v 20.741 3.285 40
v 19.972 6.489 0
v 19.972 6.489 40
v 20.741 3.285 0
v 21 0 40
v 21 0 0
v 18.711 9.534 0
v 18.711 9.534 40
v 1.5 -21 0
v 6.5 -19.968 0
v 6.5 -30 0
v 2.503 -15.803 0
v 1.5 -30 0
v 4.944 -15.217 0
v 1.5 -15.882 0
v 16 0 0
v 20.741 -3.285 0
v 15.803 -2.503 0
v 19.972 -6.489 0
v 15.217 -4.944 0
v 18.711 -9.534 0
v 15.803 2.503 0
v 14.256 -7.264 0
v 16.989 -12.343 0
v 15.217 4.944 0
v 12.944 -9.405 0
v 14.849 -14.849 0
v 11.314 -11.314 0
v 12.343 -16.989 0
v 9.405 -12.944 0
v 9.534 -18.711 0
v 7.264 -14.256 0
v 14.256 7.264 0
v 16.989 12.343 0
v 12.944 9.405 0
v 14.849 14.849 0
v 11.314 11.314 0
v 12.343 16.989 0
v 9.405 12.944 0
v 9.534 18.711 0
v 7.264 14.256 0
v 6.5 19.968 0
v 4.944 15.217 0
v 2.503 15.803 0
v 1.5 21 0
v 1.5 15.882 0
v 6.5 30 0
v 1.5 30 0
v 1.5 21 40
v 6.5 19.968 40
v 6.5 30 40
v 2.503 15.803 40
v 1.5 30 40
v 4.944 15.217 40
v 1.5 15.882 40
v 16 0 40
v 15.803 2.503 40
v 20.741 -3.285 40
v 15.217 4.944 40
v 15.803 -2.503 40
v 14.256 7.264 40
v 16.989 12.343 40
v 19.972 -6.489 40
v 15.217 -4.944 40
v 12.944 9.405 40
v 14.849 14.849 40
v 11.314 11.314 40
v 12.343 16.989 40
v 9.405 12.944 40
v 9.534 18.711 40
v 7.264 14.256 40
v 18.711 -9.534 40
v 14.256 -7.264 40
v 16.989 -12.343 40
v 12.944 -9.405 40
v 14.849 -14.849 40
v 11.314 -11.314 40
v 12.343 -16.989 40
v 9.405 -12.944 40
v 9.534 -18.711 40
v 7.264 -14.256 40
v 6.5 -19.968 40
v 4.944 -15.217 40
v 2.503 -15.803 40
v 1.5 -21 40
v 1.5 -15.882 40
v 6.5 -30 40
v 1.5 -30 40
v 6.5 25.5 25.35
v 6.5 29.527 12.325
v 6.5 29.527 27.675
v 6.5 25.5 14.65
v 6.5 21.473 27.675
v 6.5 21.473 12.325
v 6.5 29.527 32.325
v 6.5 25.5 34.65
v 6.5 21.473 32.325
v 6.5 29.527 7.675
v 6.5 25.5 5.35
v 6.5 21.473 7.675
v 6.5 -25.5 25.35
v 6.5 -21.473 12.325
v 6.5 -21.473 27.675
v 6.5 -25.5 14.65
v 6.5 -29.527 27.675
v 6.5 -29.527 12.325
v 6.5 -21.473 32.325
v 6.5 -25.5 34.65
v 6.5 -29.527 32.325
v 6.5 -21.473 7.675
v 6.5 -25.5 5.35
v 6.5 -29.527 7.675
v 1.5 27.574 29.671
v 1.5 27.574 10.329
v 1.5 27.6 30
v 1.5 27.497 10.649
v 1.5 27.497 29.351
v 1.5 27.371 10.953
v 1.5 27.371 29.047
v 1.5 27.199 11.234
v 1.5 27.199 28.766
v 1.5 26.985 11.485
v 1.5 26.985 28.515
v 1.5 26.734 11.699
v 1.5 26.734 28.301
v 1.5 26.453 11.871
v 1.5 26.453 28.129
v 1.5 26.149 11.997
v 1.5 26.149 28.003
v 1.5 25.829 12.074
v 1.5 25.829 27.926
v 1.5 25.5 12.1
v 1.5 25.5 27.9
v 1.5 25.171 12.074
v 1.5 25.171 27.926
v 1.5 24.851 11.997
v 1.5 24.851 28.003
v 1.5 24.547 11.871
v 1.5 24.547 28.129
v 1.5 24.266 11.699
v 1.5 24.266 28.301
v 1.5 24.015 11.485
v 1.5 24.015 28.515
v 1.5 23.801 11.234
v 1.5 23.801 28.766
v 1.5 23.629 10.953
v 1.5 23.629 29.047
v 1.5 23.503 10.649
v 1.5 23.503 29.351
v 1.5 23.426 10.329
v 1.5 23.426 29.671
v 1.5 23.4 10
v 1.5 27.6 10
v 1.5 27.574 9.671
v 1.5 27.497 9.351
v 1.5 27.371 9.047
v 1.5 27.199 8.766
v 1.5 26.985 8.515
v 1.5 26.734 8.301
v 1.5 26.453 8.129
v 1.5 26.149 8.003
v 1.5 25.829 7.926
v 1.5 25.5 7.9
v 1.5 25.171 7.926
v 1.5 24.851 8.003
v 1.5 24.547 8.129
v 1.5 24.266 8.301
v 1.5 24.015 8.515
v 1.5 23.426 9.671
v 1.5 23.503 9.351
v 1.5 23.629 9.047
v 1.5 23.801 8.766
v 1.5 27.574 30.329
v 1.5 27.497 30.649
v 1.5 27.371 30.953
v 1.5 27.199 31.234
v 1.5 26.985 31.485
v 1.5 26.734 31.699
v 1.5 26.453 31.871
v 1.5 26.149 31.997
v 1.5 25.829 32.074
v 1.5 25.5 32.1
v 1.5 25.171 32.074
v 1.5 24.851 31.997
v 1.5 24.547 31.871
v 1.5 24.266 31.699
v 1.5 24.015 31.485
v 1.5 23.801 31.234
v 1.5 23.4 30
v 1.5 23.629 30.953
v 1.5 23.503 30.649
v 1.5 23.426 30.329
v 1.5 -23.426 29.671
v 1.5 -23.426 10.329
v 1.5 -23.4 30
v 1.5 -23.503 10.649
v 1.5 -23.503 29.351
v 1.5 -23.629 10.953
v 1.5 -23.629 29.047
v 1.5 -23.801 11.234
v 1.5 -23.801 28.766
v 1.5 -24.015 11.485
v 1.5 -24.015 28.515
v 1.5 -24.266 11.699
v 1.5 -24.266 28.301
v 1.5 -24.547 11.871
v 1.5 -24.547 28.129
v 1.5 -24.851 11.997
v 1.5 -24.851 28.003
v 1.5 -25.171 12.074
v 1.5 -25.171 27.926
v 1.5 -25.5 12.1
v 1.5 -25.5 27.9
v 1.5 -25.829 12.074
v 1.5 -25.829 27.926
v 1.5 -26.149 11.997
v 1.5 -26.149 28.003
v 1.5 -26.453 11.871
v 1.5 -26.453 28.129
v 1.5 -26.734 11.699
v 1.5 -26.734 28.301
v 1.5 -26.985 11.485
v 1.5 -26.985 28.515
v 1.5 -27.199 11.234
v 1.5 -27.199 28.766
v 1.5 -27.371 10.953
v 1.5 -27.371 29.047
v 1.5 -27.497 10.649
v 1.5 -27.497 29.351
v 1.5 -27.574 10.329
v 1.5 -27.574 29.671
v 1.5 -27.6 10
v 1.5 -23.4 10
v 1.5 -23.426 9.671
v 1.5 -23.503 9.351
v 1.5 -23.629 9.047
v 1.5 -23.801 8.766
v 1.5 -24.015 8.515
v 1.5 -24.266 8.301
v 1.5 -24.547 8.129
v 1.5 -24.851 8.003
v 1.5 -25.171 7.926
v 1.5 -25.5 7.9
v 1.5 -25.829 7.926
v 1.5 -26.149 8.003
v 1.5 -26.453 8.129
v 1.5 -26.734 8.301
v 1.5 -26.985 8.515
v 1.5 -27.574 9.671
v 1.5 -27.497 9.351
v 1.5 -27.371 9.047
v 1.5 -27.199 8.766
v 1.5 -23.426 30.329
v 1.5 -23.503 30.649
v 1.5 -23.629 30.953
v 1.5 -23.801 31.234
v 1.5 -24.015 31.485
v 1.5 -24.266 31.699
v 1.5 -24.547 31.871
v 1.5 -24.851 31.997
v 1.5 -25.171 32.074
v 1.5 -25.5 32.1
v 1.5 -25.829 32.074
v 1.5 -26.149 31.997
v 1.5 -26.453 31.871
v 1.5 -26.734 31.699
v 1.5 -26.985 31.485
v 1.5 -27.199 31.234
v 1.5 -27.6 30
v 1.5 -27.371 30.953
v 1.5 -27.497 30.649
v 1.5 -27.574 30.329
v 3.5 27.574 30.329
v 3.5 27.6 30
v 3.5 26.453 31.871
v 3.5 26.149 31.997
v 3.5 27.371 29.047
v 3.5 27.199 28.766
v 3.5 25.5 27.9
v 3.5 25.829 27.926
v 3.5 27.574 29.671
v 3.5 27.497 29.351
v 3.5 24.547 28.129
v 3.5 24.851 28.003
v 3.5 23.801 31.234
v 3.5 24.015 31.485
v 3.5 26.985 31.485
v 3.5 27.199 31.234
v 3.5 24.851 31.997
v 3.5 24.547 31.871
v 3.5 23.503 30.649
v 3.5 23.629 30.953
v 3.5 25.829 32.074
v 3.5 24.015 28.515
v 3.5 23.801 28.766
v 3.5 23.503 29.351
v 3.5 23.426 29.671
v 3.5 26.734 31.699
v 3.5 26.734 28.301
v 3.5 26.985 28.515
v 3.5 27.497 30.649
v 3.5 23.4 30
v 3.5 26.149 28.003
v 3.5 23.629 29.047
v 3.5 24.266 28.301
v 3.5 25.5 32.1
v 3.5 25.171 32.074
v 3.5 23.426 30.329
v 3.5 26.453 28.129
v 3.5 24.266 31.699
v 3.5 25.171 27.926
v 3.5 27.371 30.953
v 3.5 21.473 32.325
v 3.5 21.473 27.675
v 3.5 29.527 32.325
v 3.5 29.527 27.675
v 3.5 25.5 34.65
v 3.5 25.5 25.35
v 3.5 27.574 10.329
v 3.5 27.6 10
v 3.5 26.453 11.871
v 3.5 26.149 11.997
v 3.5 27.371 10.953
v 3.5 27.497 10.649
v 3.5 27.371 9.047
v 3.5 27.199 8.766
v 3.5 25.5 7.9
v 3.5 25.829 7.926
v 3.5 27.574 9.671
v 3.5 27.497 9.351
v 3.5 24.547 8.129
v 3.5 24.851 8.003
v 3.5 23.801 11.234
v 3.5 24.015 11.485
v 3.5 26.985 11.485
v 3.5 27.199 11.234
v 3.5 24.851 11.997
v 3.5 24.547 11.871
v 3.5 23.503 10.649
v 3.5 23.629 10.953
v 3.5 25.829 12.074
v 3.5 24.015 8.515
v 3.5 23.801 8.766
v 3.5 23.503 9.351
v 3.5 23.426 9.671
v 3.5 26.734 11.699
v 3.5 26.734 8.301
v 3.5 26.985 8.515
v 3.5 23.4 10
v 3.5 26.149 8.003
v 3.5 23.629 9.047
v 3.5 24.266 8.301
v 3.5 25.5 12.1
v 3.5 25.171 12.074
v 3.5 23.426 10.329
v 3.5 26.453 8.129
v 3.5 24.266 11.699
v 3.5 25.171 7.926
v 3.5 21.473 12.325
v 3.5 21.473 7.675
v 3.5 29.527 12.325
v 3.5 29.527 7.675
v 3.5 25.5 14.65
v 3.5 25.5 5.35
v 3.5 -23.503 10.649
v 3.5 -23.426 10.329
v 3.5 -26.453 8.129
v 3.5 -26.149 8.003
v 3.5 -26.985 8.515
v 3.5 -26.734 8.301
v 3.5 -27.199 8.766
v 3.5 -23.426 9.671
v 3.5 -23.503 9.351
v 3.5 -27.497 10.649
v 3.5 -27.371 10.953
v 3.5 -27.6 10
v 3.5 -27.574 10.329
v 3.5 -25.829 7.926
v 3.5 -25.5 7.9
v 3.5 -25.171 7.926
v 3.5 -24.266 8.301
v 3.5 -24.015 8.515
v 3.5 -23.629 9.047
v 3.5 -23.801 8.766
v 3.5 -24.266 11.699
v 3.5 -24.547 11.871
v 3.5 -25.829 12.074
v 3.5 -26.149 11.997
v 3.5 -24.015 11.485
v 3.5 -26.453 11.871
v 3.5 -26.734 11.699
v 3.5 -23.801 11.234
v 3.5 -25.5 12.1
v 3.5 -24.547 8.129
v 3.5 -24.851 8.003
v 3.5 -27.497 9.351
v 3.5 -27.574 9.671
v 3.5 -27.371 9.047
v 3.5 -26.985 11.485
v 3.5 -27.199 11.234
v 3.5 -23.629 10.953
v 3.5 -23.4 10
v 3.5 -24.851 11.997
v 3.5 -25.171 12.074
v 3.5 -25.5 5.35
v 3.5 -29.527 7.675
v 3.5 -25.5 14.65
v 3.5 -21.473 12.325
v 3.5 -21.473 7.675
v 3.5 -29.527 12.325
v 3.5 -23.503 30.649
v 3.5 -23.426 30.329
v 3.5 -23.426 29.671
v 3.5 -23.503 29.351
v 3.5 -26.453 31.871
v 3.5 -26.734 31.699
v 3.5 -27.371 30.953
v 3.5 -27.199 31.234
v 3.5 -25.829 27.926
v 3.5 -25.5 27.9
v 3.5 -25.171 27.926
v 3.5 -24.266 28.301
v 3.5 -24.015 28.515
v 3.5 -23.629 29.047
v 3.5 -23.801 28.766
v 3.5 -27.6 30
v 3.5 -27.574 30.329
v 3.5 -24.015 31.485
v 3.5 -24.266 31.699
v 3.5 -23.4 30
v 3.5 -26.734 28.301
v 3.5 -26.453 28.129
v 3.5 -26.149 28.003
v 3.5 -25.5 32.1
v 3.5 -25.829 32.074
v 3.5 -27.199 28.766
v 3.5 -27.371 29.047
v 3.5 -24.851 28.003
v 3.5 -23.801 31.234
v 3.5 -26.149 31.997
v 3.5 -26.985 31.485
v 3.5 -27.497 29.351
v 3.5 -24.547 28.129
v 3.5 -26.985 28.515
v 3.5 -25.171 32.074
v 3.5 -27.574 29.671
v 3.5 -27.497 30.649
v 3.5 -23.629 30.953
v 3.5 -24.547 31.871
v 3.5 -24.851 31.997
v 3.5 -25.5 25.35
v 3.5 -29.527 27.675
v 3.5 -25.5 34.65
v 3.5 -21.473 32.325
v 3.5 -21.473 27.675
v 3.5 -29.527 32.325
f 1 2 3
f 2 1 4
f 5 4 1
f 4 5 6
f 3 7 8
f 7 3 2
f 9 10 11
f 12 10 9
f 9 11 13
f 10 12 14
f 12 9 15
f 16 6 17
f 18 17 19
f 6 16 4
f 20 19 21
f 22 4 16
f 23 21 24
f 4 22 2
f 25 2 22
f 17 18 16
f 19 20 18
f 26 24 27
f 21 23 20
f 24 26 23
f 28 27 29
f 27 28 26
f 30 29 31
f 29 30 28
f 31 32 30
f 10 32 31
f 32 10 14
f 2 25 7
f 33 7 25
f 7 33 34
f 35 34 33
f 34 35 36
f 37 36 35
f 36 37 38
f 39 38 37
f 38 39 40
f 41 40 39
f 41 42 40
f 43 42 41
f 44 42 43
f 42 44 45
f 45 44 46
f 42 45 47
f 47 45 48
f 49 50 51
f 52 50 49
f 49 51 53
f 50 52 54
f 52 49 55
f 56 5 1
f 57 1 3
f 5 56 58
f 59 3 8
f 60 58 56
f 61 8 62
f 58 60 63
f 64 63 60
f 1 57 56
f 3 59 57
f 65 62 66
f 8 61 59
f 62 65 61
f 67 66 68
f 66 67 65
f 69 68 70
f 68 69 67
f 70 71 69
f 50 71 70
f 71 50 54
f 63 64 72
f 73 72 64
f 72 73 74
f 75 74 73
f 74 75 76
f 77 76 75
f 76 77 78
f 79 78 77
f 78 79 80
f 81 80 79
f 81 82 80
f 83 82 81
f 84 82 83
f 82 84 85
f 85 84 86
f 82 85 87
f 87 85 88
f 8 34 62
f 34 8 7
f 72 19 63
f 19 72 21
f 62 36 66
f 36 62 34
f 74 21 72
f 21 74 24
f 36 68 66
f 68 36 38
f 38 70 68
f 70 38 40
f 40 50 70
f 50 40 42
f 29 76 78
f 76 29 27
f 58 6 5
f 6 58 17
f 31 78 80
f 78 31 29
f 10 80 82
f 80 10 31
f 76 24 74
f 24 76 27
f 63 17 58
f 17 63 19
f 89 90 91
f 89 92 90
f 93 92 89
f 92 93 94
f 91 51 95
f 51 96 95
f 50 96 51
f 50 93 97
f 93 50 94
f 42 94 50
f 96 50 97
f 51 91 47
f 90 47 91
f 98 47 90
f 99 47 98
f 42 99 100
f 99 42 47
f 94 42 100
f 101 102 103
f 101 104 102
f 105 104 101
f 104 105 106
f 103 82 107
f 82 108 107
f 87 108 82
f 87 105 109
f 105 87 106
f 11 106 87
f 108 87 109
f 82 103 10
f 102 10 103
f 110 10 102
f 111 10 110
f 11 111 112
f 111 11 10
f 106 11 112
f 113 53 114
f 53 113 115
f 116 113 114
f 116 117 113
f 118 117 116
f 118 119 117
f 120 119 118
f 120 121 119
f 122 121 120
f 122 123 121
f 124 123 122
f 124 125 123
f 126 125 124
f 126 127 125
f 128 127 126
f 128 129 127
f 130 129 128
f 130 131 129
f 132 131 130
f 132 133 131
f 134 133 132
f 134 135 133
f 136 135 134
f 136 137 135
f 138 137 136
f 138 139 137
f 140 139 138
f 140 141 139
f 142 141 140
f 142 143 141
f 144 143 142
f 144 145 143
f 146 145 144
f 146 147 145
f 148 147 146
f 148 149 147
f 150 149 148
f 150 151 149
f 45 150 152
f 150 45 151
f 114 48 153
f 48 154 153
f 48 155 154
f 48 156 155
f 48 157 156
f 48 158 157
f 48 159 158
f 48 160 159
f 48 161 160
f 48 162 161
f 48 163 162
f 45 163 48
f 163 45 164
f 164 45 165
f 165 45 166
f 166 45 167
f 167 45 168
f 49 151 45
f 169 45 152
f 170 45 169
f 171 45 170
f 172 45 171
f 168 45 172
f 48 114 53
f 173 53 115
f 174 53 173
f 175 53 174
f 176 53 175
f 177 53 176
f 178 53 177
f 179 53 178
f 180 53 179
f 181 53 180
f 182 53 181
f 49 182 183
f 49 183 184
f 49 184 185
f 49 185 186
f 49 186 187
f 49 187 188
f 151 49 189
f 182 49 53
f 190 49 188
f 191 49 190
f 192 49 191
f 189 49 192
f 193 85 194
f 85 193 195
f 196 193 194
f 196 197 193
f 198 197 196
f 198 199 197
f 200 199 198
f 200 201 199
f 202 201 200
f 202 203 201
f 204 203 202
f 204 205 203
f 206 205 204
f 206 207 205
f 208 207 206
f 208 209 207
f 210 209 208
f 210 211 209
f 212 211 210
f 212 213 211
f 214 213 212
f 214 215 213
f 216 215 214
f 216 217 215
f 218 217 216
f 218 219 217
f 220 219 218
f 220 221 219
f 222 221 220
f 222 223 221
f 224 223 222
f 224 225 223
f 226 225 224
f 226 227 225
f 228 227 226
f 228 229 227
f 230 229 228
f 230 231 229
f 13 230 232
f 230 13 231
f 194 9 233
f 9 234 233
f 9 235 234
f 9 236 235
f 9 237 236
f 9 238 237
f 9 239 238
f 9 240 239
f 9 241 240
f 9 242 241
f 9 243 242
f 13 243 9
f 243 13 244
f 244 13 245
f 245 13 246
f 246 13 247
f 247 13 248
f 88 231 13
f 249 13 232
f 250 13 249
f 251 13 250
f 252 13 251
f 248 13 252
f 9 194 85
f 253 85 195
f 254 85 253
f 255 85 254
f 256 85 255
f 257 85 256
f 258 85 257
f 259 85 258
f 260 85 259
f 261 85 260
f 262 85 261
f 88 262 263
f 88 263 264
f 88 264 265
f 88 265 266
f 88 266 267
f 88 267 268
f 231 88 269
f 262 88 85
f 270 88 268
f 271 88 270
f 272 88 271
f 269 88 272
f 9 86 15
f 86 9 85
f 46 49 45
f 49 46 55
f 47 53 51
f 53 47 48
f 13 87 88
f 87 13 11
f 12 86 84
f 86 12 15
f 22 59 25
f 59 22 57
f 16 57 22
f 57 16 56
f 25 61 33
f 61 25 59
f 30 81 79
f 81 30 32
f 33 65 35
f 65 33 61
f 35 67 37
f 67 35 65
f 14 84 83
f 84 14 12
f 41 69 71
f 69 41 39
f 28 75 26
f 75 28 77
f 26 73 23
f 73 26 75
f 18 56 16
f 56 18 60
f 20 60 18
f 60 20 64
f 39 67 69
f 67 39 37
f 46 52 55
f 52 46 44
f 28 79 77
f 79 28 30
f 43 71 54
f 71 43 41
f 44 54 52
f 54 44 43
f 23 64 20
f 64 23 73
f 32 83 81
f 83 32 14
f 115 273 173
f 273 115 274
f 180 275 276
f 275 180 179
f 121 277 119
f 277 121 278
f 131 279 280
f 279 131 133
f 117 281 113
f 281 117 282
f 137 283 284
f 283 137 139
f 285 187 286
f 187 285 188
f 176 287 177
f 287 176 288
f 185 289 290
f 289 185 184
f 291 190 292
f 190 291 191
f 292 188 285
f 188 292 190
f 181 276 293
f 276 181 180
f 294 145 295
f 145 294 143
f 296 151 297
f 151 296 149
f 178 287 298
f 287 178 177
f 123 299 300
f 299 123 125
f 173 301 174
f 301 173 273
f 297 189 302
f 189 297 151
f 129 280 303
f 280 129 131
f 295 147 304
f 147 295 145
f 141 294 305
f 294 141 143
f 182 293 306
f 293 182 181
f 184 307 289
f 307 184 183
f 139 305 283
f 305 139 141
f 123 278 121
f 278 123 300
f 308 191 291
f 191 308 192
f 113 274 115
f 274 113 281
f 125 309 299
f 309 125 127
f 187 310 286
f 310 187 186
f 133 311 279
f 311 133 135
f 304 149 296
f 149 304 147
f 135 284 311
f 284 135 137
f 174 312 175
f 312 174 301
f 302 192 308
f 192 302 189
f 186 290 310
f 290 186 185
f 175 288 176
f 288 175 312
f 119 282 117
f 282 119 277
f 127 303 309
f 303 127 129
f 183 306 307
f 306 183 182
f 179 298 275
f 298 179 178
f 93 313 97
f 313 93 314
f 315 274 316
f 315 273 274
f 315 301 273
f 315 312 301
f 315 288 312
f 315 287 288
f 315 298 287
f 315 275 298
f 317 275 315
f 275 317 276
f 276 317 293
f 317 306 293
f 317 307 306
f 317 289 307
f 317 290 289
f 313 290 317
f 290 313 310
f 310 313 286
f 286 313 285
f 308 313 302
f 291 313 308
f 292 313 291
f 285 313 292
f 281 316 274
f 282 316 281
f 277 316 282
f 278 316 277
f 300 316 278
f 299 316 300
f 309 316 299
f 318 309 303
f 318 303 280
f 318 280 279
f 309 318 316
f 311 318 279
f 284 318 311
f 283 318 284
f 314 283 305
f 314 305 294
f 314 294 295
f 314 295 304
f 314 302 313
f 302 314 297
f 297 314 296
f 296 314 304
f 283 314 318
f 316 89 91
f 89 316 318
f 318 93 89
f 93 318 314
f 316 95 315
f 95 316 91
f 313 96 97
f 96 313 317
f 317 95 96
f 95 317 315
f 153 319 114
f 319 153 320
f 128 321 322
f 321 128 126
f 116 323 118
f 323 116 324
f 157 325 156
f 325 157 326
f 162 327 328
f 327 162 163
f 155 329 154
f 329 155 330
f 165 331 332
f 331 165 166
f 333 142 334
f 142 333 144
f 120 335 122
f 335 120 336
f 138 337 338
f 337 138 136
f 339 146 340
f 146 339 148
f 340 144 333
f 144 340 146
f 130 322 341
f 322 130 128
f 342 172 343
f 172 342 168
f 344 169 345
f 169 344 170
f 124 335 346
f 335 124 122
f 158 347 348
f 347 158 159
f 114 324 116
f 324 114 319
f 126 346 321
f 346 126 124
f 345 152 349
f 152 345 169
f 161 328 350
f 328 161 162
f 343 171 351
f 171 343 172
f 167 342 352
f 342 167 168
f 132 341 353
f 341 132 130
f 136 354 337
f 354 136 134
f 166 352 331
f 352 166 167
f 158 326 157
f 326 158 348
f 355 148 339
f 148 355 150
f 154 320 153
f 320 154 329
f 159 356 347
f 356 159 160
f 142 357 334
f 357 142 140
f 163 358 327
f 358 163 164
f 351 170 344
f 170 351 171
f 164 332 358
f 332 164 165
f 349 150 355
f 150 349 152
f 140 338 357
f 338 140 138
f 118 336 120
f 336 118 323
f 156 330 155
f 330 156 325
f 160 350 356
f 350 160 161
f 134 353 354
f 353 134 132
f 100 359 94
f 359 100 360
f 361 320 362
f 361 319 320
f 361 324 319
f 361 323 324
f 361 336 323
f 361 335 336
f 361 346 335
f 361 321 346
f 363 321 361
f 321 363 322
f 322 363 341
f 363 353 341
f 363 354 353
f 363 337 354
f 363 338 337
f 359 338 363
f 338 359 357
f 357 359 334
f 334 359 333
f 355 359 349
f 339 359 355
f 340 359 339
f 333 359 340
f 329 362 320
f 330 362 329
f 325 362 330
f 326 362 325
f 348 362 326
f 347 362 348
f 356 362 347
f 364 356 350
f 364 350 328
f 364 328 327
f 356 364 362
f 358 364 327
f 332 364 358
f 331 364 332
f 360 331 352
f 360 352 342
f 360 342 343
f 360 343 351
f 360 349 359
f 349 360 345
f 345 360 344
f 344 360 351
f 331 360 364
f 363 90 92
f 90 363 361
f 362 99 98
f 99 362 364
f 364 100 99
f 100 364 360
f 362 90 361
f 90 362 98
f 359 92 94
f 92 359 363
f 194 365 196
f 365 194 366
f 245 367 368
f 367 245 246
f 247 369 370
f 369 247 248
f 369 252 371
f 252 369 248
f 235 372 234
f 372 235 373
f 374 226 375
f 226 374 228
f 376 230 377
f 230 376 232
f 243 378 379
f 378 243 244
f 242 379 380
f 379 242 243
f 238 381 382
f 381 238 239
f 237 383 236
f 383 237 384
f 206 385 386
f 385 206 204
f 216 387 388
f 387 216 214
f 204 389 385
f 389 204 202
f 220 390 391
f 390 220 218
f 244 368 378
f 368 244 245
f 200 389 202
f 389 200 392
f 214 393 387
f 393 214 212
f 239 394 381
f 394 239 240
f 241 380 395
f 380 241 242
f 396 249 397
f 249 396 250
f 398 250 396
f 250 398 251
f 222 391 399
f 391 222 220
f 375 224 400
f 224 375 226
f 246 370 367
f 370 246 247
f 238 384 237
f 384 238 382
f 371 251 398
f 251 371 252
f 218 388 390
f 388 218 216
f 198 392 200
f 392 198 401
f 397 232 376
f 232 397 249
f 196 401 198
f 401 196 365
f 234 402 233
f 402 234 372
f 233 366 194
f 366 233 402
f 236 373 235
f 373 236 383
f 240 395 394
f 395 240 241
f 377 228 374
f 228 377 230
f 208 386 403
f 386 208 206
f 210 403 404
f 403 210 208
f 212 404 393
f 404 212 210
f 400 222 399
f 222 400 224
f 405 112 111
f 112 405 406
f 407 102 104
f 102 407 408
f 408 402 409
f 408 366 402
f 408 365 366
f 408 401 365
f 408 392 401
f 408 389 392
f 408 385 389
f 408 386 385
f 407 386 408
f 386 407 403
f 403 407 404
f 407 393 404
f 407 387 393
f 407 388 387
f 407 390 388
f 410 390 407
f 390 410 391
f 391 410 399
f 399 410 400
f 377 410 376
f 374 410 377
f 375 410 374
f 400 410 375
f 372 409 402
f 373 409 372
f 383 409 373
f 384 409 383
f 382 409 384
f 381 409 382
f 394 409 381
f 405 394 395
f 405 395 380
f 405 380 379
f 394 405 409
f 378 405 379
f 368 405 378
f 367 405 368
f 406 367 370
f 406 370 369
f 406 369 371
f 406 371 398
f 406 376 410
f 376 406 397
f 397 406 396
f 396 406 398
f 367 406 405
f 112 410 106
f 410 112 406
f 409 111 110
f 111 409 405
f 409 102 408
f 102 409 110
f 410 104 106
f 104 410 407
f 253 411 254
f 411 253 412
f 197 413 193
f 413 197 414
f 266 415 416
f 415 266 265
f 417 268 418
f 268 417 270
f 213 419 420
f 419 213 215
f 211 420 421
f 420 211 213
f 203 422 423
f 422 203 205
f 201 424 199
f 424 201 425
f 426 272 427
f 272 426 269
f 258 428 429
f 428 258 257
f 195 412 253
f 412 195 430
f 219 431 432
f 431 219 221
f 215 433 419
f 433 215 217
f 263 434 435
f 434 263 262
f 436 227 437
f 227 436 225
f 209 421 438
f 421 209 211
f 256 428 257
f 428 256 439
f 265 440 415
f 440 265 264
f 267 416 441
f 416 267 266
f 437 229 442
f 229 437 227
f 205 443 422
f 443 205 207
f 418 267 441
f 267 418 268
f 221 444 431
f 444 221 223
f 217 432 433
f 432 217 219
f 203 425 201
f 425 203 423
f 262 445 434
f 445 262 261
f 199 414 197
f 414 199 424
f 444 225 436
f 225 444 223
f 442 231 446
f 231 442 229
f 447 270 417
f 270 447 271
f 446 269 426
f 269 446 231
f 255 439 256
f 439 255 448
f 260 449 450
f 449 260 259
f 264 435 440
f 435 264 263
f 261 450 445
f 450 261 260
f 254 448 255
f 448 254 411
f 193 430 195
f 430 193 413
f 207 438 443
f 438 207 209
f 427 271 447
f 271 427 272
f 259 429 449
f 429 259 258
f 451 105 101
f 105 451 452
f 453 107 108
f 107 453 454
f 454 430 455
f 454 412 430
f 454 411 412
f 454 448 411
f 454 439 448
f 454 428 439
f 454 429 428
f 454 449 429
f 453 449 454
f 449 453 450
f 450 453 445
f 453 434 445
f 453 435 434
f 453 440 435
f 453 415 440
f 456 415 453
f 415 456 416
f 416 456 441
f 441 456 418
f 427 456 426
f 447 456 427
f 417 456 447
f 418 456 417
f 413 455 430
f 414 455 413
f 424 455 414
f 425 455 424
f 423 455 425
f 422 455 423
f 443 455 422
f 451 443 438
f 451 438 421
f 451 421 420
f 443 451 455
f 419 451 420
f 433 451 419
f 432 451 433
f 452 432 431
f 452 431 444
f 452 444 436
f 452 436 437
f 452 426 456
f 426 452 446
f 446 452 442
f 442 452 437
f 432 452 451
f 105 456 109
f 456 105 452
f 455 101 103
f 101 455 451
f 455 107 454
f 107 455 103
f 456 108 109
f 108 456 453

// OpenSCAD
// file: ../SRC/ISLHOLDER01A_D02.scad
$fn=40; // model faces resolution.
include <../configuration.scad>


//Drzak na sloup - cast bez drzaku anemometru
module ISLHOLDER01A_D02(){
	
difference()
    {
    union()
        {
        //základní válec
        cylinder(h=D02_vyska_uchytky,r=(D02_prumer_obruby+2*D02_sila_materialu)/2,center=true);
		//úchytové plošky		
        translate([D02_dotahova_vzdalenost+D02_sila_materialu/2,0,0]){cube([D02_sila_materialu,D02_delka_celeho_uchytu,D02_vyska_uchytky],center=true);}
		}
    
    //válec na odečet
    cylinder(h=D02_vyska_uchytky+0.01,r=D02_prumer_obruby/2,center=true);     
	        
    //kvádr na odecet
	translate([D02_dotahova_vzdalenost-(D02_prumer_obruby+2*D02_sila_materialu)/2,0,0]){cube([D02_prumer_obruby+2*D02_sila_materialu,D02_prumer_obruby+2*D02_sila_materialu,D02_vyska_uchytky+0.01],center=true);}
		
	//otvory na sroub
	translate([D02_dotahova_vzdalenost,(D02_delka_celeho_uchytu/2-D02_prumer_obruby/2-D02_sila_materialu)/2+D02_prumer_obruby/2+D02_sila_materialu,D02_vyska_uchytky/4]){rotate([0,90,0]){cylinder(h=D02_sila_materialu+0.01,r=D02_prumer_uchytneho_sroubu/2);}}
    
     //drzak matky
    translate([D02_dotahova_vzdalenost+D02_sila_materialu-D02_vyska_matky,(D02_delka_celeho_uchytu/2-D02_prumer_obruby/2-D02_sila_materialu)/2+D02_prumer_obruby/2+D02_sila_materialu,D02_vyska_uchytky/4]){rotate([0,90,0]){ cylinder (h = D02_vyska_matky+0.01, r= (D02_sirka_matky+0.2)/2, $fn=6);}}
   
     
        
    translate([D02_dotahova_vzdalenost,(D02_delka_celeho_uchytu/2-D02_prumer_obruby/2-D02_sila_materialu)/2+D02_prumer_obruby/2+D02_sila_materialu,-D02_vyska_uchytky/4]){rotate([0,90,0]){cylinder(h=D02_sila_materialu+0.01,r=D02_prumer_uchytneho_sroubu/2);}}
    
     //drzak matky
    translate([D02_dotahova_vzdalenost+D02_sila_materialu-D02_vyska_matky,(D02_delka_celeho_uchytu/2-D02_prumer_obruby/2-D02_sila_materialu)/2+D02_prumer_obruby/2+D02_sila_materialu,-D02_vyska_uchytky/4]){rotate([0,90,0]){ cylinder (h = D02_vyska_matky+0.01, r= (D02_sirka_matky+0.2)/2, $fn=6);}}
        
	translate([D02_dotahova_vzdalenost,-((D02_delka_celeho_uchytu/2-D02_prumer_obruby/2-D02_sila_materialu)/2+D02_prumer_obruby/2+D02_sila_materialu),-D02_vyska_uchytky/4]){rotate([0,90,0]){cylinder(h=D02_sila_materialu+0.01,r=D02_prumer_uchytneho_sroubu/2);}}
    
     //drzak matky
    translate([D02_dotahova_vzdalenost+D02_sila_materialu-D02_vyska_matky,-((D02_delka_celeho_uchytu/2-D02_prumer_obruby/2-D02_sila_materialu)/2+D02_prumer_obruby/2+D02_sila_materialu),-D02_vyska_uchytky/4]){rotate([0,90,0]){ cylinder (h = D02_vyska_matky+0.01, r= (D02_sirka_matky+0.2)/2, $fn=6);}}

    translate([D02_dotahova_vzdalenost,-((D02_delka_celeho_uchytu/2-D02_prumer_obruby/2-D02_sila_materialu)/2+D02_prumer_obruby/2+D02_sila_materialu),D02_vyska_uchytky/4]){rotate([0,90,0]){cylinder(h=D02_sila_materialu+0.01,r=D02_prumer_uchytneho_sroubu/2);}}	
    
     //drzak matky
    translate([D02_dotahova_vzdalenost+D02_sila_materialu-D02_vyska_matky,-((D02_delka_celeho_uchytu/2-D02_prumer_obruby/2-D02_sila_materialu)/2+D02_prumer_obruby/2+D02_sila_materialu),D02_vyska_uchytky/4]){rotate([0,90,0]){ cylinder (h = D02_vyska_matky+0.01, r= (D02_sirka_matky+0.2)/2, $fn=6);}}
	
    }
}

module ISLHOLDER01A_D02_2(){
	
difference()
    {
    union()
        {
        //základní válec
        cylinder(h=D02_vyska_uchytky,r=(D02_prumer_obruby+2*D02_sila_materialu)/2,center=true);
		//úchytové plošky		
        translate([D02_dotahova_vzdalenost+D02_sila_materialu/2,0,0]){cube([D02_sila_materialu,D02_delka_celeho_uchytu,D02_vyska_uchytky],center=true);}
		}
    
    //válec na odečet
    cylinder(h=D02_vyska_uchytky+0.01,r=D02_prumer_obruby/2,center=true);     
	        
    //kvádr na odecet
	translate([D02_dotahova_vzdalenost-(D02_prumer_obruby+2*D02_sila_materialu)/2,0,0]){cube([D02_prumer_obruby+2*D02_sila_materialu,D02_prumer_obruby+2*D02_sila_materialu,D02_vyska_uchytky+0.01],center=true);}
		
	//otvory na sroub
	translate([D02_dotahova_vzdalenost,(D02_delka_celeho_uchytu/2-D02_prumer_obruby/2-D02_sila_materialu)/2+D02_prumer_obruby/2+D02_sila_materialu,D02_vyska_uchytky/4]){rotate([0,90,0]){cylinder(h=D02_sila_materialu+0.01,r=D02_prumer_uchytneho_sroubu/2);}}
    
    
   
     
        
    translate([D02_dotahova_vzdalenost,(D02_delka_celeho_uchytu/2-D02_prumer_obruby/2-D02_sila_materialu)/2+D02_prumer_obruby/2+D02_sila_materialu,-D02_vyska_uchytky/4]){rotate([0,90,0]){cylinder(h=D02_sila_materialu+0.01,r=D02_prumer_uchytneho_sroubu/2);}}
    
     
        
	translate([D02_dotahova_vzdalenost,-((D02_delka_celeho_uchytu/2-D02_prumer_obruby/2-D02_sila_materialu)/2+D02_prumer_obruby/2+D02_sila_materialu),-D02_vyska_uchytky/4]){rotate([0,90,0]){cylinder(h=D02_sila_materialu+0.01,r=D02_prumer_uchytneho_sroubu/2);}}
    
    

    translate([D02_dotahova_vzdalenost,-((D02_delka_celeho_uchytu/2-D02_prumer_obruby/2-D02_sila_materialu)/2+D02_prumer_obruby/2+D02_sila_materialu),D02_vyska_uchytky/4]){rotate([0,90,0]){cylinder(h=D02_sila_materialu+0.01,r=D02_prumer_uchytneho_sroubu/2);}}	
    
    
	
    }
}


//ISLHOLDER01A_D02();
// file: ../configuration.scad
$fn=40; // model faces resolution.

//Parametry pro D01 a D02
//nastavení držáku na sloup
//----------------------------------------------------------------
//----------------------------------------------------------------
//není potřeba měnit
S01_prumer_vnitrni=40;
S01_tolerance_zavit=1.5;

S01_sila_materialu=1.3; //sila výtuhy

//D01 - uchyt velky
D01_material_pod_zavitem=5;
D01_material_za_zavitem=3;
D01_material_pred_zavitem=2;
D01_delka_tyce=30;
D01_sirka_tyce=15;

//D02 - uchyt na sloup
D02_sila_materialu=5;
D02_vyska_uchytky=40;
D02_prumer_obruby=32; 
//27mm - 3/4 trubka
D02_delka_celeho_uchytu=60;
D02_dotahova_vzdalenost=1.5;
D02_prumer_uchytneho_sroubu=4.2;
D02_sirka_matky=9.1; //pro M4
D02_vyska_matky=3;


D05_vyska_drzaku_senzoru=15;
D05_prumer_zkumavky_vnitrni=21.4;
D05_vyska_podstavce=10;
D05_sirka_otvoru_na_kabel=5;
// main file
$fn=100; // model faces resolution.
include <../configuration.scad>
use <../SRC/ISLHOLDER01A_D02.scad>

rotate([0, 0, 0])
    translate([0,0,D02_vyska_uchytky/2])
        ISLHOLDER01A_D02();

            
